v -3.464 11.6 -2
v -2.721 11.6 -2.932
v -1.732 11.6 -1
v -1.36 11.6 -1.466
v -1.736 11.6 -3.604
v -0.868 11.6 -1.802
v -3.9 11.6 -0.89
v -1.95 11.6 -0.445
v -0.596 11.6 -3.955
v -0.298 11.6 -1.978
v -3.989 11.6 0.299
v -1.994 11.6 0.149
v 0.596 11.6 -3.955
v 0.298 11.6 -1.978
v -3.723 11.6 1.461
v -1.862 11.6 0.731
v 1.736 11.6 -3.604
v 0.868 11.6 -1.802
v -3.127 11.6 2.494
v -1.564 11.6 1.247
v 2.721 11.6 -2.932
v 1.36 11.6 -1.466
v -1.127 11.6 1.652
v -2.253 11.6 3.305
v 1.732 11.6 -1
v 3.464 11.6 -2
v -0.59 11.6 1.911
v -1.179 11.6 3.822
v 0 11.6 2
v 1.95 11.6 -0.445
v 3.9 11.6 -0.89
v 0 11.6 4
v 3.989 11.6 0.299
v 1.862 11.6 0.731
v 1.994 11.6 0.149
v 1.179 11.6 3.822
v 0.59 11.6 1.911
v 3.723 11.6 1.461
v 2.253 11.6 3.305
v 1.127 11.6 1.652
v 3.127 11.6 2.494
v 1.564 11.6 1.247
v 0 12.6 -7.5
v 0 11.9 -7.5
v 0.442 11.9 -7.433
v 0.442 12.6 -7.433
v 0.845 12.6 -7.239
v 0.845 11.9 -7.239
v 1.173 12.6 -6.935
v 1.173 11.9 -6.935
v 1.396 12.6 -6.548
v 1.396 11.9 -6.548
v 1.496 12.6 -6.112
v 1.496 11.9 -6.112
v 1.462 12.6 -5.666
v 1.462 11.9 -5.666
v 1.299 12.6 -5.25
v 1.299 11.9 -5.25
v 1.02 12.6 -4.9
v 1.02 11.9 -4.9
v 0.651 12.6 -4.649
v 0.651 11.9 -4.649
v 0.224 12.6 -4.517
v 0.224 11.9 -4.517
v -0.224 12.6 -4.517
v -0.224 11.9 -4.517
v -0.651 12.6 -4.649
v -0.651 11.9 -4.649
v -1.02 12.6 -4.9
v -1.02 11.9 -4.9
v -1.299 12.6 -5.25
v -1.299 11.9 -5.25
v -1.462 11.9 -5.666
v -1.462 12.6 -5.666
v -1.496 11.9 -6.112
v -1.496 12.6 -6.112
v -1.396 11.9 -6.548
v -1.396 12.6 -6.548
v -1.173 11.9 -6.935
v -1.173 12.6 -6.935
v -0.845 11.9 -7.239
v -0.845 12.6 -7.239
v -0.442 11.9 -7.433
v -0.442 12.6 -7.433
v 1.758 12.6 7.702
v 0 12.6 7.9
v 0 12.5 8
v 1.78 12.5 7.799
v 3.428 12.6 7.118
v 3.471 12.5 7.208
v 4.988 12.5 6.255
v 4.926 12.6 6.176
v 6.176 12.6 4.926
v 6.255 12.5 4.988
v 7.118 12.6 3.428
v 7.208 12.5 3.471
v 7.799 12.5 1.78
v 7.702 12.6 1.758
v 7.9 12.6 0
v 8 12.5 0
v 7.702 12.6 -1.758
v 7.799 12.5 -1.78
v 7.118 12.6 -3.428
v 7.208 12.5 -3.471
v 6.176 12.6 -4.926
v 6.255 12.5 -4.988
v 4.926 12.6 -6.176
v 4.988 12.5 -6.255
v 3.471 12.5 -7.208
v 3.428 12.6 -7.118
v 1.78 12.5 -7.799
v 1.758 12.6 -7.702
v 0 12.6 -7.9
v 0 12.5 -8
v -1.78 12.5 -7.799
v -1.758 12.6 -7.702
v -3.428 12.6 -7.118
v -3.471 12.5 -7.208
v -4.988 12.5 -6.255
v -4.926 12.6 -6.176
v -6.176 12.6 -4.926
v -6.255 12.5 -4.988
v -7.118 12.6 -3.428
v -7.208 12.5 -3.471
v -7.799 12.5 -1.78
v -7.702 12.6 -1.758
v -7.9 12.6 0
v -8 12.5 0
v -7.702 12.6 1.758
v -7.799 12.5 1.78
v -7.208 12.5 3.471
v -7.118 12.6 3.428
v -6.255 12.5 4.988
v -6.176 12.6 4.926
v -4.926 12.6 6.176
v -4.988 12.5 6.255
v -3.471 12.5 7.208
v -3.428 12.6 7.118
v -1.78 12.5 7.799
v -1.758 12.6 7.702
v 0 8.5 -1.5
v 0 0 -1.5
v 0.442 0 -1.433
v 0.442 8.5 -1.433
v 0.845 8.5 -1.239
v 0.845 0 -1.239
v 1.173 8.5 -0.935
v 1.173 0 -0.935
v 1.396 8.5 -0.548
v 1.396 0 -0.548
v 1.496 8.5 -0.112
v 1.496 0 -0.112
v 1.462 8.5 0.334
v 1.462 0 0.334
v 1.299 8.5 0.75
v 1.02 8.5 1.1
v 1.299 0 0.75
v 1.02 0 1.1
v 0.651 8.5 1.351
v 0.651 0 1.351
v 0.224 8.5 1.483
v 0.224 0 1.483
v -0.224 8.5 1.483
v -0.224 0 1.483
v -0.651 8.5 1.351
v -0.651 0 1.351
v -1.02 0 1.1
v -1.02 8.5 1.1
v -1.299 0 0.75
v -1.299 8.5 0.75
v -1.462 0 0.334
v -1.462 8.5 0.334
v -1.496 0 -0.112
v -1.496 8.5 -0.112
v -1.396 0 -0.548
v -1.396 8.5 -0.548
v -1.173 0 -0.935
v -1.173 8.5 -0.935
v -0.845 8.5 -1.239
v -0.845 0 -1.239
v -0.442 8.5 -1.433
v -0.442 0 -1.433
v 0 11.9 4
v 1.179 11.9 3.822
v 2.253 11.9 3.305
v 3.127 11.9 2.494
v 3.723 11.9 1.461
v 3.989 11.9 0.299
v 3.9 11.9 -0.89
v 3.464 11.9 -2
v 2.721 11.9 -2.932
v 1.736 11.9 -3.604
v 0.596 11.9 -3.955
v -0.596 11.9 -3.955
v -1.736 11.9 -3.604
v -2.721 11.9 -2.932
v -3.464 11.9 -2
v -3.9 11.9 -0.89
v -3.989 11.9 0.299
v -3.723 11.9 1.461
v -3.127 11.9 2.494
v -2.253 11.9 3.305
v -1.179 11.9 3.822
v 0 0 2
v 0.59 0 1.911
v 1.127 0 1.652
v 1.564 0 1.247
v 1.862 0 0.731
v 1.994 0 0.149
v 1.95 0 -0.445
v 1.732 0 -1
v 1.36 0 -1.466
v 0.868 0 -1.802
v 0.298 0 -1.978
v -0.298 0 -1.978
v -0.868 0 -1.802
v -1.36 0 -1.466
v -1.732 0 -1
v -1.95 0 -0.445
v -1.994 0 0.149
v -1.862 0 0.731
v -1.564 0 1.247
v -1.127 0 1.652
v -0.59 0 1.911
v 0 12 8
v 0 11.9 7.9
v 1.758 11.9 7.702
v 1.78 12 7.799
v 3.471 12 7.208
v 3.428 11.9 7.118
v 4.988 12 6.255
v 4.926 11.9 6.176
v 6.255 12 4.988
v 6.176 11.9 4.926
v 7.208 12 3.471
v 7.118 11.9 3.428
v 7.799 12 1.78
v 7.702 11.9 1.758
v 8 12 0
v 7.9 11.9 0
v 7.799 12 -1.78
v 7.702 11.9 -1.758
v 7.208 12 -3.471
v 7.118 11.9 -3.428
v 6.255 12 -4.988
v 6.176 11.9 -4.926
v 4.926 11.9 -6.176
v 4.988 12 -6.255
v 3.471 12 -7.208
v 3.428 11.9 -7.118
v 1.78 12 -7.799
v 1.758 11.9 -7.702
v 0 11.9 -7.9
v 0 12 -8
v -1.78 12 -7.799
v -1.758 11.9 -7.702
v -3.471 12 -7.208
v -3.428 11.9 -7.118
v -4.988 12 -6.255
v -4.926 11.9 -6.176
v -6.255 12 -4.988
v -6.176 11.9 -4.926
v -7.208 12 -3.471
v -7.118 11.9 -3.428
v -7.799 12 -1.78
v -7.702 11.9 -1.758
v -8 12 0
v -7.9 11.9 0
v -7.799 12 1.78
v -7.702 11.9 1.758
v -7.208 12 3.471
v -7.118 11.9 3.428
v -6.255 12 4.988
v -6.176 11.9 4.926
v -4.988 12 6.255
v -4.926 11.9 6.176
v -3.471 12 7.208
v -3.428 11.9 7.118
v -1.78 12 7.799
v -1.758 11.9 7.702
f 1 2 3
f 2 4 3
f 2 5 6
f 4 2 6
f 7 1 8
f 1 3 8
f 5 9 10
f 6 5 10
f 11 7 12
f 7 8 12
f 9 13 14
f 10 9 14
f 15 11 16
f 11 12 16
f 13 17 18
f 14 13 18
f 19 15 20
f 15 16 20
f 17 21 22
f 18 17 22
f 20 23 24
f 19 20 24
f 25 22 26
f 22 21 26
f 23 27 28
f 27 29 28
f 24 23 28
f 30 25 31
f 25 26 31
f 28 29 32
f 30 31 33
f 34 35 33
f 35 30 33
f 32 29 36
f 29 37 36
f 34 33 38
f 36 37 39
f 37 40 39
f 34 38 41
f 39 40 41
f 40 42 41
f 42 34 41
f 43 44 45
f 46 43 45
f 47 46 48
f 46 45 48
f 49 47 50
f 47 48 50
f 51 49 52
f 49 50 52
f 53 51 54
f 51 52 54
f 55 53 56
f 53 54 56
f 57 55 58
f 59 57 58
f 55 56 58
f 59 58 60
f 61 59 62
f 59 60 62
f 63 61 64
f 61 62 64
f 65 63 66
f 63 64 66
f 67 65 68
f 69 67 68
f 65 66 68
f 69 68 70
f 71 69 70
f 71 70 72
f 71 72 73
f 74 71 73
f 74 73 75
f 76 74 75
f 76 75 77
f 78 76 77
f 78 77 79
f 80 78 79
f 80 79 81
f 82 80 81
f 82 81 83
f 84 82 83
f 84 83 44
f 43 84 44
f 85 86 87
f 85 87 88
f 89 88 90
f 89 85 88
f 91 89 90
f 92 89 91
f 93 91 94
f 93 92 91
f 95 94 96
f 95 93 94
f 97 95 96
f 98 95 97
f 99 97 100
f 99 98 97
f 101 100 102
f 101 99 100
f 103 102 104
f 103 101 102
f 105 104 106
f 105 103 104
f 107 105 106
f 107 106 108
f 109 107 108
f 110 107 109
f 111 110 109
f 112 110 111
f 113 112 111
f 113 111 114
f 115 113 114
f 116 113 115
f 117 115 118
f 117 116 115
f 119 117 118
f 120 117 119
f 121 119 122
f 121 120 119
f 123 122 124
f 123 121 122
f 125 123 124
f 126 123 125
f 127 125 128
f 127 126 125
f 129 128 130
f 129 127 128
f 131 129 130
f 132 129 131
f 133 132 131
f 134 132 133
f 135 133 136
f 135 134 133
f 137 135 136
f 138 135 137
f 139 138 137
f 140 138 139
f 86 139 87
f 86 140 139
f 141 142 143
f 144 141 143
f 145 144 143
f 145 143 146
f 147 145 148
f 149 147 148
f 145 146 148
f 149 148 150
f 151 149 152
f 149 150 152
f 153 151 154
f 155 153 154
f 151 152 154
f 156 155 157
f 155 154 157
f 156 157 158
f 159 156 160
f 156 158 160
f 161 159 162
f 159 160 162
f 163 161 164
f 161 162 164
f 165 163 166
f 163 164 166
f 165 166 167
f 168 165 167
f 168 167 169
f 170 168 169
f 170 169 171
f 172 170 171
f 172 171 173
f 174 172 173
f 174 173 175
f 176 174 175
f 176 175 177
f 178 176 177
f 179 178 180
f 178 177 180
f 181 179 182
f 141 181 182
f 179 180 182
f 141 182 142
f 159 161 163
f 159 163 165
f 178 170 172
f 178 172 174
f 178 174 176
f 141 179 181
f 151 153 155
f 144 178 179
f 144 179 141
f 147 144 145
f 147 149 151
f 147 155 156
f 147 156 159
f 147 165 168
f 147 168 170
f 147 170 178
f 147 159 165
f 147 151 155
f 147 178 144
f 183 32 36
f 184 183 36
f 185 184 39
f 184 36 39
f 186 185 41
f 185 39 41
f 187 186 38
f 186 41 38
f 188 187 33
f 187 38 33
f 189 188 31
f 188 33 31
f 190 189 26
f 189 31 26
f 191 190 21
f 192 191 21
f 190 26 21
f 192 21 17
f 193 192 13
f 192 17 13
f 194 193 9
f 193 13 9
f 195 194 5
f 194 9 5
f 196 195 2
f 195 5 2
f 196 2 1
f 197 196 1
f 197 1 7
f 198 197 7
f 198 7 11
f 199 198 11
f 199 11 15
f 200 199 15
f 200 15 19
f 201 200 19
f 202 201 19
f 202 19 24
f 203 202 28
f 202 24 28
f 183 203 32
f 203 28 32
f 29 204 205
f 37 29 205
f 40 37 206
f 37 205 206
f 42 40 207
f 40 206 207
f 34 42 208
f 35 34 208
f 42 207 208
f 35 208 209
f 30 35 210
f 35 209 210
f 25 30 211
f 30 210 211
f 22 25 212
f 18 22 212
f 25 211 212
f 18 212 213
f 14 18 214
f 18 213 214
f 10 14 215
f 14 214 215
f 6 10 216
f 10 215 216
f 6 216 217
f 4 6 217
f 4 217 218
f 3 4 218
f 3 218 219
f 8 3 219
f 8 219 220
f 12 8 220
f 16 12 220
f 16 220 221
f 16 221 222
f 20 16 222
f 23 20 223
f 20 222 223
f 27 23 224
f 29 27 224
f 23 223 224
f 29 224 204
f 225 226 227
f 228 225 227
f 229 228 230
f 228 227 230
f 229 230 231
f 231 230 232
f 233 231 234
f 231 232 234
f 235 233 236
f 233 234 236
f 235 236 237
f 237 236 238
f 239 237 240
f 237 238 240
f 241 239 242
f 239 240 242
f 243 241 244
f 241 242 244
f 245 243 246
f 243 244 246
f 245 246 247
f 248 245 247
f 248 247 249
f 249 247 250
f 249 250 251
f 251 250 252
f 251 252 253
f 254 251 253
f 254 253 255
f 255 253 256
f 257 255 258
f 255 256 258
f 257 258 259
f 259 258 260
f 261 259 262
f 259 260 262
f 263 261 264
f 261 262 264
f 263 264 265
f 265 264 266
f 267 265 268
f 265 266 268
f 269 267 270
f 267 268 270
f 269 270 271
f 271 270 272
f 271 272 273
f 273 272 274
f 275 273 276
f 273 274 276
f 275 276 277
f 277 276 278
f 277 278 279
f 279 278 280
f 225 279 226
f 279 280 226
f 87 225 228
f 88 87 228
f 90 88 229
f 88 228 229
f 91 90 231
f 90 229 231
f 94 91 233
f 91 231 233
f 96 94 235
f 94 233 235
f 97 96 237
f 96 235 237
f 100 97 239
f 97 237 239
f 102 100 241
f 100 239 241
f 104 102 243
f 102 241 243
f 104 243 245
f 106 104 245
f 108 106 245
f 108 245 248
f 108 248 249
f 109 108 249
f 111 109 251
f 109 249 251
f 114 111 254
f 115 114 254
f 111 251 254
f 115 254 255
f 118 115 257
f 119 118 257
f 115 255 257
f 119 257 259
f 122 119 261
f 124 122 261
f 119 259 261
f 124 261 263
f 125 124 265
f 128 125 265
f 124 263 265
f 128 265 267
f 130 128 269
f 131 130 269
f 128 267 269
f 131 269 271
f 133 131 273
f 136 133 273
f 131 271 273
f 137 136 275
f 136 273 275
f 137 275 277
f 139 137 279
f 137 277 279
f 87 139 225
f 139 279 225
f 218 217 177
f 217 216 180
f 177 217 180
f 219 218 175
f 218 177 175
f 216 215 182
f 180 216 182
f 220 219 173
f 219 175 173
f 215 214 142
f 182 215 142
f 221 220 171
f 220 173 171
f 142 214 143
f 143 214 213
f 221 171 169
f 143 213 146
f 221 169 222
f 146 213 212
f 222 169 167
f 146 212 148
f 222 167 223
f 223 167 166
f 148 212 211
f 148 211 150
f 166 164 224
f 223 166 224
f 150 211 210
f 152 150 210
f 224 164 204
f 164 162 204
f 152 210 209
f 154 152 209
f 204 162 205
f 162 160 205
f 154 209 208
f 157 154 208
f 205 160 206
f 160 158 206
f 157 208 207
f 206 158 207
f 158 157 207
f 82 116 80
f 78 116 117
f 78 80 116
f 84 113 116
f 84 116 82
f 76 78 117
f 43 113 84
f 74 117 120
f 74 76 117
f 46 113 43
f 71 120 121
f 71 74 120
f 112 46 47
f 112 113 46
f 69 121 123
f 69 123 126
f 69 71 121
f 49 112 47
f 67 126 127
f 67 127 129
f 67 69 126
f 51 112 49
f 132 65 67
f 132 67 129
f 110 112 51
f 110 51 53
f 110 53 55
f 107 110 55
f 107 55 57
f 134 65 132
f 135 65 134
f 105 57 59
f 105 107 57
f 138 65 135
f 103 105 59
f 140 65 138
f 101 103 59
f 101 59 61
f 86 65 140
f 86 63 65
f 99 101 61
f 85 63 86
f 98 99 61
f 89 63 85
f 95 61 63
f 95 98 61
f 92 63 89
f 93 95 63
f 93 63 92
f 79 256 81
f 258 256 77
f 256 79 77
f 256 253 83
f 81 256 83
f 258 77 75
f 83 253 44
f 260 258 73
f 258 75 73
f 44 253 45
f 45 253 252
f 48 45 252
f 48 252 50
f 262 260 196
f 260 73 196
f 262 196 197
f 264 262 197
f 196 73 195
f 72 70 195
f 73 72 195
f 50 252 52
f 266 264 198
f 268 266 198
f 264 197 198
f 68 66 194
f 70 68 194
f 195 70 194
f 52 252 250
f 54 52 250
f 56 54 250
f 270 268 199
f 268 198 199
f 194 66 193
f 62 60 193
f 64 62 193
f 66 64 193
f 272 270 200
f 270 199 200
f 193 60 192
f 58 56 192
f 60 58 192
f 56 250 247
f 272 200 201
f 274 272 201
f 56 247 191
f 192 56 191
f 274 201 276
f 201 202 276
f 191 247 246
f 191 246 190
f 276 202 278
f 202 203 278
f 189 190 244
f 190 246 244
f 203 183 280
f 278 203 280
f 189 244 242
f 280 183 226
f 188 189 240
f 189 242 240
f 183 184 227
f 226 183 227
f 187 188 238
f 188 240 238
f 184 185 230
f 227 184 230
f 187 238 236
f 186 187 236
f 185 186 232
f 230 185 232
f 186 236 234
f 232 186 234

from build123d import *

# Parameters (mm, degrees)
SKETCH2_R           = 2
BOSS_EXTRUDE1_DEPTH = 11.6
SKETCH3_R           = 4
BOSS_EXTRUDE2_DEPTH = 0.3
SKETCH4_R           = 8
BOSS_EXTRUDE3_DEPTH = 0.7
SKETCH5_R           = 1.5
CUT_EXTRUDE1_DEPTH  = 8.5
SKETCH6_R           = 1.5
CUT_EXTRUDE2_DEPTH  = 17.419805115
CHAMFER1_SIZE       = 0.1


with BuildPart() as part:
    # Sketch2 → Boss-Extrude1 (new body)
    with BuildSketch(Plane(origin=(0, 0, 0), x_dir=(1, 0, 0), z_dir=(0, 1, 0))):
        with Locations(Location((0, 0, 0), (0, 0, 270))):
            Circle(SKETCH2_R)
    extrude(amount=BOSS_EXTRUDE1_DEPTH)

    # Sketch3 → Boss-Extrude2 (add)
    with BuildSketch(Plane(origin=(0, 11.6, 0), x_dir=(1, 0, 0), z_dir=(0, 1, 0))):
        with Locations(Location((0, 0, 0), (0, 0, 270))):
            Circle(SKETCH3_R)
    extrude(amount=BOSS_EXTRUDE2_DEPTH)

    # Sketch4 → Boss-Extrude3 (add)
    with BuildSketch(Plane(origin=(0, 11.9, 0), x_dir=(1, 0, 0), z_dir=(0, 1, 0))):
        with Locations(Location((0, 0, 0), (0, 0, 270))):
            Circle(SKETCH4_R)
    extrude(amount=BOSS_EXTRUDE3_DEPTH)

    # Sketch5 → Cut-Extrude1 (cut)
    with BuildSketch(Plane.XZ):
        with Locations(Location((0, 0, 0), (0, 0, 270))):
            Circle(SKETCH5_R)
    extrude(amount=-CUT_EXTRUDE1_DEPTH, mode=Mode.SUBTRACT)

    # Sketch6 → Cut-Extrude2 (cut, through all)
    with BuildSketch(Plane.XZ.offset(-11.9)):
        with Locations(Location((0, -6, 0), (0, 0, 270))):
            Circle(SKETCH6_R)
    extrude(amount=-CUT_EXTRUDE2_DEPTH, mode=Mode.SUBTRACT)

    # Chamfer1
    chamfer1_edges = [part.edges().sort_by_distance(p)[0] for p in [
        (0, 12.6, -8),
        (0, 11.9, -8),
    ]]
    chamfer(chamfer1_edges, length=CHAMFER1_SIZE)


solid = part.part
